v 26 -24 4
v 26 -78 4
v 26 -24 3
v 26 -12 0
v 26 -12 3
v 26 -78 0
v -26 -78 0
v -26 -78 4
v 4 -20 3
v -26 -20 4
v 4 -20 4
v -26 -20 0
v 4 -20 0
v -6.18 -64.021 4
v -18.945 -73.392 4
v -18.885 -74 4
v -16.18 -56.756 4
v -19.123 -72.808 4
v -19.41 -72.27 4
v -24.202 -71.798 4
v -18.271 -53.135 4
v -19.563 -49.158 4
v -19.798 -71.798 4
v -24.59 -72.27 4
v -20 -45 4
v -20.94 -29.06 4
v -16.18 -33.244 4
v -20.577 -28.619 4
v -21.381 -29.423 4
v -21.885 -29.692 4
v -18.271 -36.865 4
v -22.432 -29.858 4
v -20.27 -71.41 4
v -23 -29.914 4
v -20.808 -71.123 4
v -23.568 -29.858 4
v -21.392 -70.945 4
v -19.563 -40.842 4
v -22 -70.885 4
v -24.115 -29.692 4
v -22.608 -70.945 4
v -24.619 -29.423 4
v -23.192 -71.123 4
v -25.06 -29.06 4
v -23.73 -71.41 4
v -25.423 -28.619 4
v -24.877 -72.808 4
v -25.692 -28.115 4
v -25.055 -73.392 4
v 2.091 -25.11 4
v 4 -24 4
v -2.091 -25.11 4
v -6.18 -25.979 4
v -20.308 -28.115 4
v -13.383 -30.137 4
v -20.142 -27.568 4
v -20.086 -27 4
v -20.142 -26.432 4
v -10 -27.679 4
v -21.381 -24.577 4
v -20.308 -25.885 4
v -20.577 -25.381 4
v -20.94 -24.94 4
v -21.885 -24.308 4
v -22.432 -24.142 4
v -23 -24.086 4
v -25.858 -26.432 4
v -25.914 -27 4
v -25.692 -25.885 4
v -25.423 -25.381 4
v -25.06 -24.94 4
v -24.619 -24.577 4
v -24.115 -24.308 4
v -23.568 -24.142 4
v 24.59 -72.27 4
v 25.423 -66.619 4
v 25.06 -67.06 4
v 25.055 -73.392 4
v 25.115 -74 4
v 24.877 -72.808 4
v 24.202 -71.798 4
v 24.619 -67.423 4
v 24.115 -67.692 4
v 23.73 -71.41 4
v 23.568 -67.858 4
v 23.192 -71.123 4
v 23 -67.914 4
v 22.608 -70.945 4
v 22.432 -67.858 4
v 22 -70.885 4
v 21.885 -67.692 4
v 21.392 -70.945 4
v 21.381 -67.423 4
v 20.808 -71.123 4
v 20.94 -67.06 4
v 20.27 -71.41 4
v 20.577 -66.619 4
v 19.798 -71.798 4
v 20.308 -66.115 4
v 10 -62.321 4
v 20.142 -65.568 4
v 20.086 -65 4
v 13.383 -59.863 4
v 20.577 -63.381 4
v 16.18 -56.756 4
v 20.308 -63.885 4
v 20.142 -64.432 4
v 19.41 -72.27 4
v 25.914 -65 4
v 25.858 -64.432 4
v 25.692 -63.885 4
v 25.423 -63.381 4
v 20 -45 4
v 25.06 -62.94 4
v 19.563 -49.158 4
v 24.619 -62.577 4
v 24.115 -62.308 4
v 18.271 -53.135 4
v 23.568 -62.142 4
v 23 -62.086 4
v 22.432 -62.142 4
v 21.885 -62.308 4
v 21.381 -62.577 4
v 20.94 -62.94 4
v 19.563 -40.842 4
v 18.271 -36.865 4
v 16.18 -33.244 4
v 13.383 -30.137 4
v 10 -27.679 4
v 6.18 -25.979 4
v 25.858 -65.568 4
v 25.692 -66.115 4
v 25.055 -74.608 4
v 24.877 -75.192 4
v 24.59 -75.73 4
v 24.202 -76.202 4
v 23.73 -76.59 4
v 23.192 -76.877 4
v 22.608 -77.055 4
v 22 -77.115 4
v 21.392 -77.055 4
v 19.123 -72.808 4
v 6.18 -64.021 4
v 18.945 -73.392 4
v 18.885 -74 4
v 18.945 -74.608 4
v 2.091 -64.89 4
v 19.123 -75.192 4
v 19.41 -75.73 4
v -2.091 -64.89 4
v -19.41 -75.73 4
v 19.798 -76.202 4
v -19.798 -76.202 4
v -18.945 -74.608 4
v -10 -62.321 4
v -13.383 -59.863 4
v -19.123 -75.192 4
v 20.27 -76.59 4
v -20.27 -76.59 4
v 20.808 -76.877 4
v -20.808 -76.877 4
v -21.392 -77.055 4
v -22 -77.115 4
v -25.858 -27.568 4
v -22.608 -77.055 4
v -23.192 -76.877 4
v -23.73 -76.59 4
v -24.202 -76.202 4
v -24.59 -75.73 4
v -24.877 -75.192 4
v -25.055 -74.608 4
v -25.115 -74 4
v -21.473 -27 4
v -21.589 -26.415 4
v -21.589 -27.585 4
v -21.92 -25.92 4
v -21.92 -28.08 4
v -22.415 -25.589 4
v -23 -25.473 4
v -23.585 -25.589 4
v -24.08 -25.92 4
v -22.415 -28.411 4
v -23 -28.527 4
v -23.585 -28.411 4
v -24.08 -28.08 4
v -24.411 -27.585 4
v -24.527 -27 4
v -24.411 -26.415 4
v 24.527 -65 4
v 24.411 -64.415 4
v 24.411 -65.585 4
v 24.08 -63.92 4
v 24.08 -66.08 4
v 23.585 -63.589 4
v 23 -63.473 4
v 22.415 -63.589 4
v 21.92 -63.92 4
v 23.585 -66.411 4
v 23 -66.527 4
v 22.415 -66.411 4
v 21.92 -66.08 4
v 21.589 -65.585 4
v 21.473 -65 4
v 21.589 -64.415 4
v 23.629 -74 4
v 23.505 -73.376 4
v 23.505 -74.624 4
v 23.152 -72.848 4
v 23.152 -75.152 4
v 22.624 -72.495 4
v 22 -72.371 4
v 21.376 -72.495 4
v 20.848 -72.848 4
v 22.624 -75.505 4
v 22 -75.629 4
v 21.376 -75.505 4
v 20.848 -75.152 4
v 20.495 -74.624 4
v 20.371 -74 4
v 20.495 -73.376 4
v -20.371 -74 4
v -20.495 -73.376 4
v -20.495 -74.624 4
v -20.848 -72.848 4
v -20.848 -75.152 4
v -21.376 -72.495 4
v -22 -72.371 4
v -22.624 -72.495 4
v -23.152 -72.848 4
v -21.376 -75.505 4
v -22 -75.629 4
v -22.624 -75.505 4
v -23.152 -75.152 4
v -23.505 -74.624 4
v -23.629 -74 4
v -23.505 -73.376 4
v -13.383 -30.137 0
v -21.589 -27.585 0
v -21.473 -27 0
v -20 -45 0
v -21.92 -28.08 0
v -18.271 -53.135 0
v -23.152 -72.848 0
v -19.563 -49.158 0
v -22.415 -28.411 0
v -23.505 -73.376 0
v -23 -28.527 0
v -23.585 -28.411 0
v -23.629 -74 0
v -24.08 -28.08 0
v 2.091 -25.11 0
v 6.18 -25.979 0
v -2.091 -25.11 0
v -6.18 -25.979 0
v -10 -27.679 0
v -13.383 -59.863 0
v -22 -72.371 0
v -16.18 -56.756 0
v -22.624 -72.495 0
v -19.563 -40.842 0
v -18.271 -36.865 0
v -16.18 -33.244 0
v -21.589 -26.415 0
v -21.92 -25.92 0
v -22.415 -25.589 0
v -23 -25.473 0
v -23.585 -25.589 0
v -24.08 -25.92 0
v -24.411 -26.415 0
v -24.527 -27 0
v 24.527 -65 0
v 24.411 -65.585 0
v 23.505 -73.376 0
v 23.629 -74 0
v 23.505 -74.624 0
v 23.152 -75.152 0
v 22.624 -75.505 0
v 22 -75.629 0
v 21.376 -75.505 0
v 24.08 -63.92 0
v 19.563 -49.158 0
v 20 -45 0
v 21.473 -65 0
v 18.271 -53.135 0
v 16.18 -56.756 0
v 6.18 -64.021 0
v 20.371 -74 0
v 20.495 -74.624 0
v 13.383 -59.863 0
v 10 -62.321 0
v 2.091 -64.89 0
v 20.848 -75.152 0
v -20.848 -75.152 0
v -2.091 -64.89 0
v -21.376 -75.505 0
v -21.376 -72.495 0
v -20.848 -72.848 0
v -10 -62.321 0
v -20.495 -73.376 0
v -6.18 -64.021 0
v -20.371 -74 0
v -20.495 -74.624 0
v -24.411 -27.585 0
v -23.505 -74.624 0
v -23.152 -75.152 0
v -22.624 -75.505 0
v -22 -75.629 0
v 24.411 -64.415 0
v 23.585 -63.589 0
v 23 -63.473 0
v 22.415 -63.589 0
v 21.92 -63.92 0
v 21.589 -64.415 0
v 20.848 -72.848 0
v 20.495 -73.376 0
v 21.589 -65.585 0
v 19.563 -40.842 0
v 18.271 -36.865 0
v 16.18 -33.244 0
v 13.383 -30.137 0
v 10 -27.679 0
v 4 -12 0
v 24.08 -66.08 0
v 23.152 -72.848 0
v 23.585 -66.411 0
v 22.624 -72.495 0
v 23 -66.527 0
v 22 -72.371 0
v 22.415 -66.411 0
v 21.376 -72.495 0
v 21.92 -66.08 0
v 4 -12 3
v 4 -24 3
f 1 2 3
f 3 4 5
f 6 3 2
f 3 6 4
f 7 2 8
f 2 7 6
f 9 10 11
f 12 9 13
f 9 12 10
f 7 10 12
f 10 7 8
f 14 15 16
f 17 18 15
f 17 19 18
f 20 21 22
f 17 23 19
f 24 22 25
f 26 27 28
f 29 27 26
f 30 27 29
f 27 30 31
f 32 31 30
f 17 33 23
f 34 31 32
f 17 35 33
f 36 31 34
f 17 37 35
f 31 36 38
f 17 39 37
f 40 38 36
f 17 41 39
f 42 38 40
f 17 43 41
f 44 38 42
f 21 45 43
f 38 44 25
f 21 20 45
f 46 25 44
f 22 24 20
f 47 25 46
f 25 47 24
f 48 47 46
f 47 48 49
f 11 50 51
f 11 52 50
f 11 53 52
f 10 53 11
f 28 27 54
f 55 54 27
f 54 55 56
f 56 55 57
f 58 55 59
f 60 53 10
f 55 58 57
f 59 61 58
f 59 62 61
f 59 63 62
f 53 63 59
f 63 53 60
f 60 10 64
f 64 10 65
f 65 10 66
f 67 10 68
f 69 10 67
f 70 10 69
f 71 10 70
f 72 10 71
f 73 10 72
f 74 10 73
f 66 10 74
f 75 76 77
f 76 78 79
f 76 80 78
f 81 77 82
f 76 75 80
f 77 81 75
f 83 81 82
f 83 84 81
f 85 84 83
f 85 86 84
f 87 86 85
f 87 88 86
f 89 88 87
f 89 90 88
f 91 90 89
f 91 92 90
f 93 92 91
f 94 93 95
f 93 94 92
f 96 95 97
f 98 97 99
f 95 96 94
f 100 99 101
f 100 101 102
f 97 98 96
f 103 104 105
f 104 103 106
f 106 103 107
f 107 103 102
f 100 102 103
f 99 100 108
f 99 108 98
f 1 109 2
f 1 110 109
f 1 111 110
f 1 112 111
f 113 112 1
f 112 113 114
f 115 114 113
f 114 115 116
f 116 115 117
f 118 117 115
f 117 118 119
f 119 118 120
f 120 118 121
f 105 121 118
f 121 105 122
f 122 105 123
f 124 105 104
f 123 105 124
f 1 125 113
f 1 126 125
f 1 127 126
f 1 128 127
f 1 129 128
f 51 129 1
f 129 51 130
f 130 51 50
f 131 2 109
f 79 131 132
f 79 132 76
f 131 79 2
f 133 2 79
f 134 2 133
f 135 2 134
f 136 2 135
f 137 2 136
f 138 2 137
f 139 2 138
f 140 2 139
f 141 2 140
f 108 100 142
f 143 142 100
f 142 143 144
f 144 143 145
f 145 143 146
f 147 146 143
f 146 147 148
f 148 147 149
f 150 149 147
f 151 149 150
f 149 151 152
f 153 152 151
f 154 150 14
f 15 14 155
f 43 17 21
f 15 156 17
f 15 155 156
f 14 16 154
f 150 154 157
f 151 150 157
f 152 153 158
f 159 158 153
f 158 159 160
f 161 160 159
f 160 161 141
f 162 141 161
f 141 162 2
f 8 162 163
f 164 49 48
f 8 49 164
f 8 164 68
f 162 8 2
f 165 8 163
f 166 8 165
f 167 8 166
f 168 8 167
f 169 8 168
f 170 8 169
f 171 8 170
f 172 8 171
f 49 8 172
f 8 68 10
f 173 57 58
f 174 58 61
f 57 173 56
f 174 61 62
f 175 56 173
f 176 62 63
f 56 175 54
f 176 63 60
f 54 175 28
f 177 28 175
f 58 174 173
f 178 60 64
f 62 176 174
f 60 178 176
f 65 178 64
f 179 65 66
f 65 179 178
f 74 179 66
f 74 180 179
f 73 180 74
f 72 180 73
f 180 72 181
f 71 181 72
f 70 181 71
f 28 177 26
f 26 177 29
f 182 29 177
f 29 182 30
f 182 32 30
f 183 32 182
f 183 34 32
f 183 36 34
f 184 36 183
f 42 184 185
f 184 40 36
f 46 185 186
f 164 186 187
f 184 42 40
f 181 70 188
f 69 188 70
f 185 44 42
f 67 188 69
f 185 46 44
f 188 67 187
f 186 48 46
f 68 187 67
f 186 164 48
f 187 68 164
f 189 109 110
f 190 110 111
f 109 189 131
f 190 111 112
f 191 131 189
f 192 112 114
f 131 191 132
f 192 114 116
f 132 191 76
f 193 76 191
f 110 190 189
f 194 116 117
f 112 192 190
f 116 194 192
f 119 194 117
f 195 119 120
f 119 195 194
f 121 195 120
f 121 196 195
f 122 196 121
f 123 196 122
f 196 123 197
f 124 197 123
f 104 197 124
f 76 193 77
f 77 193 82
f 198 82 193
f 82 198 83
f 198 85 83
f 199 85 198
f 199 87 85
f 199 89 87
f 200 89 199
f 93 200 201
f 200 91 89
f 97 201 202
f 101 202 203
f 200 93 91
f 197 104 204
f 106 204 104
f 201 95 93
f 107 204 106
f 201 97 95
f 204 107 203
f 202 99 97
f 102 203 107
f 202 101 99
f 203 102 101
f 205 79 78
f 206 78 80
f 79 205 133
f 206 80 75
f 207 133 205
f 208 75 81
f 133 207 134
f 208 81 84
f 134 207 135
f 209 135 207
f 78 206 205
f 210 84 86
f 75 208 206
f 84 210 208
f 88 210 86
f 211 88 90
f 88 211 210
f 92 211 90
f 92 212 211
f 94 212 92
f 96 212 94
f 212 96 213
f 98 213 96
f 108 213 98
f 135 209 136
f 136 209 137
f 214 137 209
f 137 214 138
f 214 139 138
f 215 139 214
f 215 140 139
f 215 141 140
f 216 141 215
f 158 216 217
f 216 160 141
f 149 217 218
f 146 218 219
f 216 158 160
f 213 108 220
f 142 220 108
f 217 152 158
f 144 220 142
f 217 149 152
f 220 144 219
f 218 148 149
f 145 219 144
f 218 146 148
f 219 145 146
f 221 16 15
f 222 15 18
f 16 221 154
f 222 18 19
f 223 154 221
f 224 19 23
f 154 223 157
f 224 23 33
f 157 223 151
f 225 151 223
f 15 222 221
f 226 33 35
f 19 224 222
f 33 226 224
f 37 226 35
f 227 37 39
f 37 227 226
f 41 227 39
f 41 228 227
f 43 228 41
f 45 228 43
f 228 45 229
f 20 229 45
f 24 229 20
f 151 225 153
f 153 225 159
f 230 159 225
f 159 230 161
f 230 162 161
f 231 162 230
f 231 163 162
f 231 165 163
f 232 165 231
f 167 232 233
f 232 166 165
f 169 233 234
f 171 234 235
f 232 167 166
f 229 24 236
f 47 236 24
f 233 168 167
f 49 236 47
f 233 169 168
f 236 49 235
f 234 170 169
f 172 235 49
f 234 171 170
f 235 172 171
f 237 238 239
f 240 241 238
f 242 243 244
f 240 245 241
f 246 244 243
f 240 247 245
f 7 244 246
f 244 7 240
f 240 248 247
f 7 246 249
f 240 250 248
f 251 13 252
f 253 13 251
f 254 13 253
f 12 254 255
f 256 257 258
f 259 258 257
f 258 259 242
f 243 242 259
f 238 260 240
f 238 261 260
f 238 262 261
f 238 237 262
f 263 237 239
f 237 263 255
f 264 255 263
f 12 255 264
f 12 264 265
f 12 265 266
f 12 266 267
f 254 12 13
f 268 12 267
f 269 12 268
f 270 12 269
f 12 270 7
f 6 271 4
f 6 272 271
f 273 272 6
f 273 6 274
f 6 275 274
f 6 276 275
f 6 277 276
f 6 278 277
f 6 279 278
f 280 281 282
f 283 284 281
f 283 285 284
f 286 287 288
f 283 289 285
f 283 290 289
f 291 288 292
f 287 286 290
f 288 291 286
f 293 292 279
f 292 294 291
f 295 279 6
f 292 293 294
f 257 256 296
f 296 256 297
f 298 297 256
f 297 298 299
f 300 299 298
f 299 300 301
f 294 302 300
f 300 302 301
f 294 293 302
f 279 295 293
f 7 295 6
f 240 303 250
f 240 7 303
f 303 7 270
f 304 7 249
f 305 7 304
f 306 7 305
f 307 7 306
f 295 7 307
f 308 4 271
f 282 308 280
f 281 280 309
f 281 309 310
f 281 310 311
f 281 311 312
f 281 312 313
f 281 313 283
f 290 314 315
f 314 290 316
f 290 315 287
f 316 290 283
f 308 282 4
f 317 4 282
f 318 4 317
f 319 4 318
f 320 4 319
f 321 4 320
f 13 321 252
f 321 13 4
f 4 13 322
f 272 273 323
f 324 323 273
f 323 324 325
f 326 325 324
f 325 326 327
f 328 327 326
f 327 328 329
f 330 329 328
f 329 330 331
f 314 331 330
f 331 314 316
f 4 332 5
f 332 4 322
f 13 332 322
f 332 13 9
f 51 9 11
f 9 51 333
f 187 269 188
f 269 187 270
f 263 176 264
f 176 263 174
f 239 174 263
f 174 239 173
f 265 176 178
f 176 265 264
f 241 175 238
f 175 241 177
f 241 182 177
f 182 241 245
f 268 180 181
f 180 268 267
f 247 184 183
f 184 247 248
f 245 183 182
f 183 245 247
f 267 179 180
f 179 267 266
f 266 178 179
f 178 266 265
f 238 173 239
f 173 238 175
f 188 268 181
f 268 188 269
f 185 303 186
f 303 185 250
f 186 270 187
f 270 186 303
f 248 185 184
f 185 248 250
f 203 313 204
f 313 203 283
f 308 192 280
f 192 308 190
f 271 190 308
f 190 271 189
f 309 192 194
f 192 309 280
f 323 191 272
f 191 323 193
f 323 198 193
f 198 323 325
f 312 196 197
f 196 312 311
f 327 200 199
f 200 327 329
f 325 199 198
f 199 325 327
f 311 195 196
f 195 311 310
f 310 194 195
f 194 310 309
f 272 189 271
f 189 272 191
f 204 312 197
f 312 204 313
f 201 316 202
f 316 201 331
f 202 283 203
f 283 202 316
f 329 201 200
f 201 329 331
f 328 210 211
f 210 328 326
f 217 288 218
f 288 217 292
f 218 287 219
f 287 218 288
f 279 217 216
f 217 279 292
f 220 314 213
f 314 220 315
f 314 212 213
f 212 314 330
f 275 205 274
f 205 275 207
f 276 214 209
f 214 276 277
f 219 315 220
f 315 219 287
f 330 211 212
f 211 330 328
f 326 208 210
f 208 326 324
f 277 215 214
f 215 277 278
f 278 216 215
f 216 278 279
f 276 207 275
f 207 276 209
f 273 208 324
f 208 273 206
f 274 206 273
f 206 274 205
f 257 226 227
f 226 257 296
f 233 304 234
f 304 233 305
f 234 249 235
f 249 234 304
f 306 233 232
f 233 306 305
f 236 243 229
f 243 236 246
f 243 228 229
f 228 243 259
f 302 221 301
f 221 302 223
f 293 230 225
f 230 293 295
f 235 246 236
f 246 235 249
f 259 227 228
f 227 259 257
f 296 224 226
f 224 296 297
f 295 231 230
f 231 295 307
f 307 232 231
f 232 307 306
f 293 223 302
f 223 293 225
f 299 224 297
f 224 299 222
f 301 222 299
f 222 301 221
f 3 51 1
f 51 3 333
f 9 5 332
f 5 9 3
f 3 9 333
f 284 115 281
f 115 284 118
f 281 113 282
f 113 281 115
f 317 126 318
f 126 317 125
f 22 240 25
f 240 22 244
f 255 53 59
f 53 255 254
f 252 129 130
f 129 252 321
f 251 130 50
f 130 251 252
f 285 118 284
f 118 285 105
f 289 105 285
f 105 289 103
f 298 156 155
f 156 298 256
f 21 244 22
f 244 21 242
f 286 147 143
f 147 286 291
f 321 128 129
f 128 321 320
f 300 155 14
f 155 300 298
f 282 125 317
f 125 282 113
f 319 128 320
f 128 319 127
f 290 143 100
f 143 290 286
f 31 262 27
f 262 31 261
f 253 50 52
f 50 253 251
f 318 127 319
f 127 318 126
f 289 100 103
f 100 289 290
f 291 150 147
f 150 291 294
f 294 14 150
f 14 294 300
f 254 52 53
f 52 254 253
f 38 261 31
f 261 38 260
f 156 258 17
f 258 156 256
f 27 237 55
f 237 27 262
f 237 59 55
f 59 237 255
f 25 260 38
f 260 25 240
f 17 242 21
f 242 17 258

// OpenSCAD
// file: bolts.scad
$radial_error = 0.1;
$fn = 16;

module cylinder_outer(height, radius, fn=$fn, extension=0) {
	fudge = 1/cos(180/fn);
	translate([0, 0, -extension]) cylinder(h=height+extension,r=radius*fudge+$radial_error, $fn=fn);
}

module cylinder_inner(height, radius, fn=$fn, extension=0) {
	translate([0, 0, -extension]) cylinder(h=height+extension,r=radius-$radial_error,$fn=fn);
}

// Make a hole for a bolt/screw combination.
module bolt(diameter=3, depth=8, nut_offset=2, shaft_length=10, inset=10) {
	hole(diameter, depth, inset);
	hull() {
		shaft_width = diameter;
		translate([0, 0, nut_offset]) rotate(360/12, [0, 0, 1]) cylinder_outer(diameter, shaft_width, 6);
		translate([0, shaft_length, nut_offset]) rotate(360/12, [0, 0, 1]) cylinder_outer(diameter, shaft_width, 6);
	}
}

// Make a hole. The diameter is the size of the screw (e.g. 3 for M3). Depth is how far the hole should go for the thread, and inset is how far out there should be a hole for the head to go.
module hole(diameter=3, depth=6, inset=10, extension=0) {
	cylinder_outer(depth, diameter/2, extension=extension);
	translate([0, 0, depth]) cylinder_outer(inset, diameter, 32);
}

module countersunk_hole(diameter=3, depth=6, inset=10) {
	hole(diameter, depth, inset);
	translate([0, 0, depth-diameter/2]) cylinder(r1=diameter/2+$radial_error, r2=diameter+$radial_error, h=diameter/2);
}

module mounting_hole(diameter=3, depth=6, inset=10, outset=3) {
	difference() {
		cylinder_outer(depth, diameter/2+outset);
		hole(diameter=diameter, depth=depth, inset=inset);
	}
}

rotate(90, [1, 0, 0]) difference() {
	cube([30, 10, 10]);
	translate([5, 5, 0]) bolt(diameter=3, depth=8);
	translate([15, 5, 0]) bolt(diameter=4, depth=8);
	translate([25, 5, 0]) countersunk_hole(diameter=4, depth=8);
}
// file: intake.scad
use <bolts.scad>;

clip_offset = 0.5;
extruder_offset = 20;

// The amount to offset the fan duct. This really depends on the kind of blower fan you have and how far it fits on the ducting.
fan_duct_offset = 1;

// Distance from outside of metal case to center of extruder.
fan_mount_offset = 24;
top_screws_offset = -1.5 / 2;

thickness = 1;
offset = 4;

module clip() {
	color("blue") render() translate([2, 0, 12]) {
		difference() {
			union() {
				translate([0, -8, 0]) {
					cube([8, 8, 8]);
					translate([18, 0, 0]) cube([8, 8, 8]);
				}
				translate([0, -2, 0]) cube([26, 24, 8]);
			}
			translate([2, 0, 0]) cube([22, 20, 8]);
			translate([2+6, -2, 0]) cube([22-12, 2, 8]);
			
			translate([0, -4, 4]) rotate([90, 0, 90]) bolt(3, 22, 2.5);
		}
	}
}

module fan_opening() {
	translate([0, offset, 0]) {
		translate([5, 0, 11]) cube([20, 15, 10]);
		translate([25, 15/2-3/2, 20-3]) cube([0.5, 3, 4]);
	}
}

module fan_intake(inner_radius, outer_radius, duct_rotation, height=4, width=20, inset_radius=2) {
	render() translate([5, 0, 0]) difference() {
		union() {
			translate([0, offset, 10]) cube([20, 15, 10-thickness-fan_duct_offset]);
			// Fan attachment:
			hull() {
				translate([0, offset, 10]) cube([20, 15, 1]);
				intersection() {
					translate([0, 15/2+offset, 15/2]) rotate(90, [0, 1, 0]) cylinder(h=20,r=15/2);
					translate([0, offset, 0]) cube([20, 15, 10]);
				}
				
				translate([0, offset-inset_radius, 0]) rotate(-90, [0, 0, 1]) cube([1, 20, height]);
			}
			
			// Bottom connector to duct:
			hull() {
				across = outer_radius - inner_radius;
				
				translate([0, offset-inset_radius, 0]) rotate(-90, [0, 0, 1]) cube([1, 20, height]);
				translate([-5, -25, 0]) rotate(duct_rotation, [0, 0, 1]) translate([-1, inner_radius, 0]) cube([1, across, height]);
			}
		}
		
		// Cut out the rounded inset:
		inset_offset = height + inset_radius;
		
		translate([0, -inset_radius+offset, inset_offset]) rotate(90, [0, 1, 0]) cylinder(h=width,r=inset_radius);
		translate([0, -inset_radius-height, height]) cube([width, height+offset, 10]);
		translate([0, -inset_radius+offset, inset_offset]) cube([20, inset_radius, inset_radius+height]);
	}
}

module fan_ducting_example(o) {
	render() translate([0, 0, thickness]) difference() {
		union() {
			render() minkowski() {
				fan_intake();
				translate([0, 0, -thickness]) cylinder(h=thickness*2,r=thickness,$fn=8);
			}
		}
		fan_intake();
		fan_opening();
	}
}

module fan_mock() {
	render() translate([0, offset, extruder_offset+50/2]) rotate(-90, [1, 0, 0]) {
		translate([0, 0, 15/2]) cube([50, 50, 15], center=true);
	}
}

block_height = 8;

module fan_mount_holes(thickness=2) {
	translate([0, -thickness-8, 50+block_height/2]) rotate(180, [0, 0, 1]) rotate(90, [1, 0, 0]) {
		translate([-22, 0, 0]) bolt(depth=10);
		translate([ 22, 0, 0]) bolt(depth=10);
	}
}

module fan_mount_top(inset=2) {
	render() translate([0, 2, extruder_offset]) difference() {
		translate([-26, -inset, 0]) {
			// scews centered by 30 apart
			translate([0, -10, 50]) cube([52, 10, block_height]);
		}
		
		// The offset of the screw is 3 from the edge.
		hull() {
			translate([-14, -inset-3, 50]) hole(depth=block_height, inset=0);
			translate([-16, -inset-3, 50]) hole(depth=block_height, inset=0);
		}
		
		hull() {
			translate([14, -inset-3, 50]) hole(depth=block_height, inset=0);
			translate([16, -inset-3, 50]) hole(depth=block_height, inset=0);
		}
		
		fan_mount_holes();
	}
}

module fan_mount_bracket(thickness=4) {
	bottom_extension = 8;
	
	render() translate([0, thickness, extruder_offset]) difference() {
		translate([-26, -thickness, 0]) {
			//55 to base of fan
			translate([0, 0, 0]) cube([52, thickness, 50+block_height]);
			
			translate([30, 0, -bottom_extension]) cube([22, 18, bottom_extension+2]);
		}
		
		// Inset for duct attachment:
		translate([4, -1, -bottom_extension]) cube([22, 1+16+4, bottom_extension+4]);

		translate([0, 0, 25]) rotate(90, [1, 0, 0]) cylinder(r=20,h=thickness+1);
		
		translate([0, 0, 50/2]) rotate([-90, 0, 0]) {
			translate([-23, 18, -thickness]) hole(diameter=2.8, depth=thickness, inset=1, extension=1);
			translate([23, -20, -thickness]) hole(diameter=2.8, depth=thickness, inset=1, extension=1);
		}
		
		fan_mount_holes();
	}
}

module extruder() {
	color("orange") {
		translate([0, 0, 6]) cylinder(h=70-6, r=3);
		cylinder(h=6,r1=0.5, r2=5);
		translate([0, 0, 10+15/2]) cube([18, 22, 15], true);
	}
}

module fan_example() {
	//extruder();
	translate([0, 25, 0]) {
		fan_mock();
		
		clip();
		
		fan_mount_top();
		fan_mount_bracket();
		
		fan_ducting_example();
		
		color("red") fan_opening();
		//color("blue") fan_intake();
		//color("green") fan_intake_plug();
	}
}

module fan_bracket() {
	translate([0, fan_mount_offset, 0]) {
		fan_mount_bracket();
		fan_mount_top();
	}
}

fan_example();
// main file
use <intake.scad>;

rotate([90, 0, 0]) fan_mount_bracket();
